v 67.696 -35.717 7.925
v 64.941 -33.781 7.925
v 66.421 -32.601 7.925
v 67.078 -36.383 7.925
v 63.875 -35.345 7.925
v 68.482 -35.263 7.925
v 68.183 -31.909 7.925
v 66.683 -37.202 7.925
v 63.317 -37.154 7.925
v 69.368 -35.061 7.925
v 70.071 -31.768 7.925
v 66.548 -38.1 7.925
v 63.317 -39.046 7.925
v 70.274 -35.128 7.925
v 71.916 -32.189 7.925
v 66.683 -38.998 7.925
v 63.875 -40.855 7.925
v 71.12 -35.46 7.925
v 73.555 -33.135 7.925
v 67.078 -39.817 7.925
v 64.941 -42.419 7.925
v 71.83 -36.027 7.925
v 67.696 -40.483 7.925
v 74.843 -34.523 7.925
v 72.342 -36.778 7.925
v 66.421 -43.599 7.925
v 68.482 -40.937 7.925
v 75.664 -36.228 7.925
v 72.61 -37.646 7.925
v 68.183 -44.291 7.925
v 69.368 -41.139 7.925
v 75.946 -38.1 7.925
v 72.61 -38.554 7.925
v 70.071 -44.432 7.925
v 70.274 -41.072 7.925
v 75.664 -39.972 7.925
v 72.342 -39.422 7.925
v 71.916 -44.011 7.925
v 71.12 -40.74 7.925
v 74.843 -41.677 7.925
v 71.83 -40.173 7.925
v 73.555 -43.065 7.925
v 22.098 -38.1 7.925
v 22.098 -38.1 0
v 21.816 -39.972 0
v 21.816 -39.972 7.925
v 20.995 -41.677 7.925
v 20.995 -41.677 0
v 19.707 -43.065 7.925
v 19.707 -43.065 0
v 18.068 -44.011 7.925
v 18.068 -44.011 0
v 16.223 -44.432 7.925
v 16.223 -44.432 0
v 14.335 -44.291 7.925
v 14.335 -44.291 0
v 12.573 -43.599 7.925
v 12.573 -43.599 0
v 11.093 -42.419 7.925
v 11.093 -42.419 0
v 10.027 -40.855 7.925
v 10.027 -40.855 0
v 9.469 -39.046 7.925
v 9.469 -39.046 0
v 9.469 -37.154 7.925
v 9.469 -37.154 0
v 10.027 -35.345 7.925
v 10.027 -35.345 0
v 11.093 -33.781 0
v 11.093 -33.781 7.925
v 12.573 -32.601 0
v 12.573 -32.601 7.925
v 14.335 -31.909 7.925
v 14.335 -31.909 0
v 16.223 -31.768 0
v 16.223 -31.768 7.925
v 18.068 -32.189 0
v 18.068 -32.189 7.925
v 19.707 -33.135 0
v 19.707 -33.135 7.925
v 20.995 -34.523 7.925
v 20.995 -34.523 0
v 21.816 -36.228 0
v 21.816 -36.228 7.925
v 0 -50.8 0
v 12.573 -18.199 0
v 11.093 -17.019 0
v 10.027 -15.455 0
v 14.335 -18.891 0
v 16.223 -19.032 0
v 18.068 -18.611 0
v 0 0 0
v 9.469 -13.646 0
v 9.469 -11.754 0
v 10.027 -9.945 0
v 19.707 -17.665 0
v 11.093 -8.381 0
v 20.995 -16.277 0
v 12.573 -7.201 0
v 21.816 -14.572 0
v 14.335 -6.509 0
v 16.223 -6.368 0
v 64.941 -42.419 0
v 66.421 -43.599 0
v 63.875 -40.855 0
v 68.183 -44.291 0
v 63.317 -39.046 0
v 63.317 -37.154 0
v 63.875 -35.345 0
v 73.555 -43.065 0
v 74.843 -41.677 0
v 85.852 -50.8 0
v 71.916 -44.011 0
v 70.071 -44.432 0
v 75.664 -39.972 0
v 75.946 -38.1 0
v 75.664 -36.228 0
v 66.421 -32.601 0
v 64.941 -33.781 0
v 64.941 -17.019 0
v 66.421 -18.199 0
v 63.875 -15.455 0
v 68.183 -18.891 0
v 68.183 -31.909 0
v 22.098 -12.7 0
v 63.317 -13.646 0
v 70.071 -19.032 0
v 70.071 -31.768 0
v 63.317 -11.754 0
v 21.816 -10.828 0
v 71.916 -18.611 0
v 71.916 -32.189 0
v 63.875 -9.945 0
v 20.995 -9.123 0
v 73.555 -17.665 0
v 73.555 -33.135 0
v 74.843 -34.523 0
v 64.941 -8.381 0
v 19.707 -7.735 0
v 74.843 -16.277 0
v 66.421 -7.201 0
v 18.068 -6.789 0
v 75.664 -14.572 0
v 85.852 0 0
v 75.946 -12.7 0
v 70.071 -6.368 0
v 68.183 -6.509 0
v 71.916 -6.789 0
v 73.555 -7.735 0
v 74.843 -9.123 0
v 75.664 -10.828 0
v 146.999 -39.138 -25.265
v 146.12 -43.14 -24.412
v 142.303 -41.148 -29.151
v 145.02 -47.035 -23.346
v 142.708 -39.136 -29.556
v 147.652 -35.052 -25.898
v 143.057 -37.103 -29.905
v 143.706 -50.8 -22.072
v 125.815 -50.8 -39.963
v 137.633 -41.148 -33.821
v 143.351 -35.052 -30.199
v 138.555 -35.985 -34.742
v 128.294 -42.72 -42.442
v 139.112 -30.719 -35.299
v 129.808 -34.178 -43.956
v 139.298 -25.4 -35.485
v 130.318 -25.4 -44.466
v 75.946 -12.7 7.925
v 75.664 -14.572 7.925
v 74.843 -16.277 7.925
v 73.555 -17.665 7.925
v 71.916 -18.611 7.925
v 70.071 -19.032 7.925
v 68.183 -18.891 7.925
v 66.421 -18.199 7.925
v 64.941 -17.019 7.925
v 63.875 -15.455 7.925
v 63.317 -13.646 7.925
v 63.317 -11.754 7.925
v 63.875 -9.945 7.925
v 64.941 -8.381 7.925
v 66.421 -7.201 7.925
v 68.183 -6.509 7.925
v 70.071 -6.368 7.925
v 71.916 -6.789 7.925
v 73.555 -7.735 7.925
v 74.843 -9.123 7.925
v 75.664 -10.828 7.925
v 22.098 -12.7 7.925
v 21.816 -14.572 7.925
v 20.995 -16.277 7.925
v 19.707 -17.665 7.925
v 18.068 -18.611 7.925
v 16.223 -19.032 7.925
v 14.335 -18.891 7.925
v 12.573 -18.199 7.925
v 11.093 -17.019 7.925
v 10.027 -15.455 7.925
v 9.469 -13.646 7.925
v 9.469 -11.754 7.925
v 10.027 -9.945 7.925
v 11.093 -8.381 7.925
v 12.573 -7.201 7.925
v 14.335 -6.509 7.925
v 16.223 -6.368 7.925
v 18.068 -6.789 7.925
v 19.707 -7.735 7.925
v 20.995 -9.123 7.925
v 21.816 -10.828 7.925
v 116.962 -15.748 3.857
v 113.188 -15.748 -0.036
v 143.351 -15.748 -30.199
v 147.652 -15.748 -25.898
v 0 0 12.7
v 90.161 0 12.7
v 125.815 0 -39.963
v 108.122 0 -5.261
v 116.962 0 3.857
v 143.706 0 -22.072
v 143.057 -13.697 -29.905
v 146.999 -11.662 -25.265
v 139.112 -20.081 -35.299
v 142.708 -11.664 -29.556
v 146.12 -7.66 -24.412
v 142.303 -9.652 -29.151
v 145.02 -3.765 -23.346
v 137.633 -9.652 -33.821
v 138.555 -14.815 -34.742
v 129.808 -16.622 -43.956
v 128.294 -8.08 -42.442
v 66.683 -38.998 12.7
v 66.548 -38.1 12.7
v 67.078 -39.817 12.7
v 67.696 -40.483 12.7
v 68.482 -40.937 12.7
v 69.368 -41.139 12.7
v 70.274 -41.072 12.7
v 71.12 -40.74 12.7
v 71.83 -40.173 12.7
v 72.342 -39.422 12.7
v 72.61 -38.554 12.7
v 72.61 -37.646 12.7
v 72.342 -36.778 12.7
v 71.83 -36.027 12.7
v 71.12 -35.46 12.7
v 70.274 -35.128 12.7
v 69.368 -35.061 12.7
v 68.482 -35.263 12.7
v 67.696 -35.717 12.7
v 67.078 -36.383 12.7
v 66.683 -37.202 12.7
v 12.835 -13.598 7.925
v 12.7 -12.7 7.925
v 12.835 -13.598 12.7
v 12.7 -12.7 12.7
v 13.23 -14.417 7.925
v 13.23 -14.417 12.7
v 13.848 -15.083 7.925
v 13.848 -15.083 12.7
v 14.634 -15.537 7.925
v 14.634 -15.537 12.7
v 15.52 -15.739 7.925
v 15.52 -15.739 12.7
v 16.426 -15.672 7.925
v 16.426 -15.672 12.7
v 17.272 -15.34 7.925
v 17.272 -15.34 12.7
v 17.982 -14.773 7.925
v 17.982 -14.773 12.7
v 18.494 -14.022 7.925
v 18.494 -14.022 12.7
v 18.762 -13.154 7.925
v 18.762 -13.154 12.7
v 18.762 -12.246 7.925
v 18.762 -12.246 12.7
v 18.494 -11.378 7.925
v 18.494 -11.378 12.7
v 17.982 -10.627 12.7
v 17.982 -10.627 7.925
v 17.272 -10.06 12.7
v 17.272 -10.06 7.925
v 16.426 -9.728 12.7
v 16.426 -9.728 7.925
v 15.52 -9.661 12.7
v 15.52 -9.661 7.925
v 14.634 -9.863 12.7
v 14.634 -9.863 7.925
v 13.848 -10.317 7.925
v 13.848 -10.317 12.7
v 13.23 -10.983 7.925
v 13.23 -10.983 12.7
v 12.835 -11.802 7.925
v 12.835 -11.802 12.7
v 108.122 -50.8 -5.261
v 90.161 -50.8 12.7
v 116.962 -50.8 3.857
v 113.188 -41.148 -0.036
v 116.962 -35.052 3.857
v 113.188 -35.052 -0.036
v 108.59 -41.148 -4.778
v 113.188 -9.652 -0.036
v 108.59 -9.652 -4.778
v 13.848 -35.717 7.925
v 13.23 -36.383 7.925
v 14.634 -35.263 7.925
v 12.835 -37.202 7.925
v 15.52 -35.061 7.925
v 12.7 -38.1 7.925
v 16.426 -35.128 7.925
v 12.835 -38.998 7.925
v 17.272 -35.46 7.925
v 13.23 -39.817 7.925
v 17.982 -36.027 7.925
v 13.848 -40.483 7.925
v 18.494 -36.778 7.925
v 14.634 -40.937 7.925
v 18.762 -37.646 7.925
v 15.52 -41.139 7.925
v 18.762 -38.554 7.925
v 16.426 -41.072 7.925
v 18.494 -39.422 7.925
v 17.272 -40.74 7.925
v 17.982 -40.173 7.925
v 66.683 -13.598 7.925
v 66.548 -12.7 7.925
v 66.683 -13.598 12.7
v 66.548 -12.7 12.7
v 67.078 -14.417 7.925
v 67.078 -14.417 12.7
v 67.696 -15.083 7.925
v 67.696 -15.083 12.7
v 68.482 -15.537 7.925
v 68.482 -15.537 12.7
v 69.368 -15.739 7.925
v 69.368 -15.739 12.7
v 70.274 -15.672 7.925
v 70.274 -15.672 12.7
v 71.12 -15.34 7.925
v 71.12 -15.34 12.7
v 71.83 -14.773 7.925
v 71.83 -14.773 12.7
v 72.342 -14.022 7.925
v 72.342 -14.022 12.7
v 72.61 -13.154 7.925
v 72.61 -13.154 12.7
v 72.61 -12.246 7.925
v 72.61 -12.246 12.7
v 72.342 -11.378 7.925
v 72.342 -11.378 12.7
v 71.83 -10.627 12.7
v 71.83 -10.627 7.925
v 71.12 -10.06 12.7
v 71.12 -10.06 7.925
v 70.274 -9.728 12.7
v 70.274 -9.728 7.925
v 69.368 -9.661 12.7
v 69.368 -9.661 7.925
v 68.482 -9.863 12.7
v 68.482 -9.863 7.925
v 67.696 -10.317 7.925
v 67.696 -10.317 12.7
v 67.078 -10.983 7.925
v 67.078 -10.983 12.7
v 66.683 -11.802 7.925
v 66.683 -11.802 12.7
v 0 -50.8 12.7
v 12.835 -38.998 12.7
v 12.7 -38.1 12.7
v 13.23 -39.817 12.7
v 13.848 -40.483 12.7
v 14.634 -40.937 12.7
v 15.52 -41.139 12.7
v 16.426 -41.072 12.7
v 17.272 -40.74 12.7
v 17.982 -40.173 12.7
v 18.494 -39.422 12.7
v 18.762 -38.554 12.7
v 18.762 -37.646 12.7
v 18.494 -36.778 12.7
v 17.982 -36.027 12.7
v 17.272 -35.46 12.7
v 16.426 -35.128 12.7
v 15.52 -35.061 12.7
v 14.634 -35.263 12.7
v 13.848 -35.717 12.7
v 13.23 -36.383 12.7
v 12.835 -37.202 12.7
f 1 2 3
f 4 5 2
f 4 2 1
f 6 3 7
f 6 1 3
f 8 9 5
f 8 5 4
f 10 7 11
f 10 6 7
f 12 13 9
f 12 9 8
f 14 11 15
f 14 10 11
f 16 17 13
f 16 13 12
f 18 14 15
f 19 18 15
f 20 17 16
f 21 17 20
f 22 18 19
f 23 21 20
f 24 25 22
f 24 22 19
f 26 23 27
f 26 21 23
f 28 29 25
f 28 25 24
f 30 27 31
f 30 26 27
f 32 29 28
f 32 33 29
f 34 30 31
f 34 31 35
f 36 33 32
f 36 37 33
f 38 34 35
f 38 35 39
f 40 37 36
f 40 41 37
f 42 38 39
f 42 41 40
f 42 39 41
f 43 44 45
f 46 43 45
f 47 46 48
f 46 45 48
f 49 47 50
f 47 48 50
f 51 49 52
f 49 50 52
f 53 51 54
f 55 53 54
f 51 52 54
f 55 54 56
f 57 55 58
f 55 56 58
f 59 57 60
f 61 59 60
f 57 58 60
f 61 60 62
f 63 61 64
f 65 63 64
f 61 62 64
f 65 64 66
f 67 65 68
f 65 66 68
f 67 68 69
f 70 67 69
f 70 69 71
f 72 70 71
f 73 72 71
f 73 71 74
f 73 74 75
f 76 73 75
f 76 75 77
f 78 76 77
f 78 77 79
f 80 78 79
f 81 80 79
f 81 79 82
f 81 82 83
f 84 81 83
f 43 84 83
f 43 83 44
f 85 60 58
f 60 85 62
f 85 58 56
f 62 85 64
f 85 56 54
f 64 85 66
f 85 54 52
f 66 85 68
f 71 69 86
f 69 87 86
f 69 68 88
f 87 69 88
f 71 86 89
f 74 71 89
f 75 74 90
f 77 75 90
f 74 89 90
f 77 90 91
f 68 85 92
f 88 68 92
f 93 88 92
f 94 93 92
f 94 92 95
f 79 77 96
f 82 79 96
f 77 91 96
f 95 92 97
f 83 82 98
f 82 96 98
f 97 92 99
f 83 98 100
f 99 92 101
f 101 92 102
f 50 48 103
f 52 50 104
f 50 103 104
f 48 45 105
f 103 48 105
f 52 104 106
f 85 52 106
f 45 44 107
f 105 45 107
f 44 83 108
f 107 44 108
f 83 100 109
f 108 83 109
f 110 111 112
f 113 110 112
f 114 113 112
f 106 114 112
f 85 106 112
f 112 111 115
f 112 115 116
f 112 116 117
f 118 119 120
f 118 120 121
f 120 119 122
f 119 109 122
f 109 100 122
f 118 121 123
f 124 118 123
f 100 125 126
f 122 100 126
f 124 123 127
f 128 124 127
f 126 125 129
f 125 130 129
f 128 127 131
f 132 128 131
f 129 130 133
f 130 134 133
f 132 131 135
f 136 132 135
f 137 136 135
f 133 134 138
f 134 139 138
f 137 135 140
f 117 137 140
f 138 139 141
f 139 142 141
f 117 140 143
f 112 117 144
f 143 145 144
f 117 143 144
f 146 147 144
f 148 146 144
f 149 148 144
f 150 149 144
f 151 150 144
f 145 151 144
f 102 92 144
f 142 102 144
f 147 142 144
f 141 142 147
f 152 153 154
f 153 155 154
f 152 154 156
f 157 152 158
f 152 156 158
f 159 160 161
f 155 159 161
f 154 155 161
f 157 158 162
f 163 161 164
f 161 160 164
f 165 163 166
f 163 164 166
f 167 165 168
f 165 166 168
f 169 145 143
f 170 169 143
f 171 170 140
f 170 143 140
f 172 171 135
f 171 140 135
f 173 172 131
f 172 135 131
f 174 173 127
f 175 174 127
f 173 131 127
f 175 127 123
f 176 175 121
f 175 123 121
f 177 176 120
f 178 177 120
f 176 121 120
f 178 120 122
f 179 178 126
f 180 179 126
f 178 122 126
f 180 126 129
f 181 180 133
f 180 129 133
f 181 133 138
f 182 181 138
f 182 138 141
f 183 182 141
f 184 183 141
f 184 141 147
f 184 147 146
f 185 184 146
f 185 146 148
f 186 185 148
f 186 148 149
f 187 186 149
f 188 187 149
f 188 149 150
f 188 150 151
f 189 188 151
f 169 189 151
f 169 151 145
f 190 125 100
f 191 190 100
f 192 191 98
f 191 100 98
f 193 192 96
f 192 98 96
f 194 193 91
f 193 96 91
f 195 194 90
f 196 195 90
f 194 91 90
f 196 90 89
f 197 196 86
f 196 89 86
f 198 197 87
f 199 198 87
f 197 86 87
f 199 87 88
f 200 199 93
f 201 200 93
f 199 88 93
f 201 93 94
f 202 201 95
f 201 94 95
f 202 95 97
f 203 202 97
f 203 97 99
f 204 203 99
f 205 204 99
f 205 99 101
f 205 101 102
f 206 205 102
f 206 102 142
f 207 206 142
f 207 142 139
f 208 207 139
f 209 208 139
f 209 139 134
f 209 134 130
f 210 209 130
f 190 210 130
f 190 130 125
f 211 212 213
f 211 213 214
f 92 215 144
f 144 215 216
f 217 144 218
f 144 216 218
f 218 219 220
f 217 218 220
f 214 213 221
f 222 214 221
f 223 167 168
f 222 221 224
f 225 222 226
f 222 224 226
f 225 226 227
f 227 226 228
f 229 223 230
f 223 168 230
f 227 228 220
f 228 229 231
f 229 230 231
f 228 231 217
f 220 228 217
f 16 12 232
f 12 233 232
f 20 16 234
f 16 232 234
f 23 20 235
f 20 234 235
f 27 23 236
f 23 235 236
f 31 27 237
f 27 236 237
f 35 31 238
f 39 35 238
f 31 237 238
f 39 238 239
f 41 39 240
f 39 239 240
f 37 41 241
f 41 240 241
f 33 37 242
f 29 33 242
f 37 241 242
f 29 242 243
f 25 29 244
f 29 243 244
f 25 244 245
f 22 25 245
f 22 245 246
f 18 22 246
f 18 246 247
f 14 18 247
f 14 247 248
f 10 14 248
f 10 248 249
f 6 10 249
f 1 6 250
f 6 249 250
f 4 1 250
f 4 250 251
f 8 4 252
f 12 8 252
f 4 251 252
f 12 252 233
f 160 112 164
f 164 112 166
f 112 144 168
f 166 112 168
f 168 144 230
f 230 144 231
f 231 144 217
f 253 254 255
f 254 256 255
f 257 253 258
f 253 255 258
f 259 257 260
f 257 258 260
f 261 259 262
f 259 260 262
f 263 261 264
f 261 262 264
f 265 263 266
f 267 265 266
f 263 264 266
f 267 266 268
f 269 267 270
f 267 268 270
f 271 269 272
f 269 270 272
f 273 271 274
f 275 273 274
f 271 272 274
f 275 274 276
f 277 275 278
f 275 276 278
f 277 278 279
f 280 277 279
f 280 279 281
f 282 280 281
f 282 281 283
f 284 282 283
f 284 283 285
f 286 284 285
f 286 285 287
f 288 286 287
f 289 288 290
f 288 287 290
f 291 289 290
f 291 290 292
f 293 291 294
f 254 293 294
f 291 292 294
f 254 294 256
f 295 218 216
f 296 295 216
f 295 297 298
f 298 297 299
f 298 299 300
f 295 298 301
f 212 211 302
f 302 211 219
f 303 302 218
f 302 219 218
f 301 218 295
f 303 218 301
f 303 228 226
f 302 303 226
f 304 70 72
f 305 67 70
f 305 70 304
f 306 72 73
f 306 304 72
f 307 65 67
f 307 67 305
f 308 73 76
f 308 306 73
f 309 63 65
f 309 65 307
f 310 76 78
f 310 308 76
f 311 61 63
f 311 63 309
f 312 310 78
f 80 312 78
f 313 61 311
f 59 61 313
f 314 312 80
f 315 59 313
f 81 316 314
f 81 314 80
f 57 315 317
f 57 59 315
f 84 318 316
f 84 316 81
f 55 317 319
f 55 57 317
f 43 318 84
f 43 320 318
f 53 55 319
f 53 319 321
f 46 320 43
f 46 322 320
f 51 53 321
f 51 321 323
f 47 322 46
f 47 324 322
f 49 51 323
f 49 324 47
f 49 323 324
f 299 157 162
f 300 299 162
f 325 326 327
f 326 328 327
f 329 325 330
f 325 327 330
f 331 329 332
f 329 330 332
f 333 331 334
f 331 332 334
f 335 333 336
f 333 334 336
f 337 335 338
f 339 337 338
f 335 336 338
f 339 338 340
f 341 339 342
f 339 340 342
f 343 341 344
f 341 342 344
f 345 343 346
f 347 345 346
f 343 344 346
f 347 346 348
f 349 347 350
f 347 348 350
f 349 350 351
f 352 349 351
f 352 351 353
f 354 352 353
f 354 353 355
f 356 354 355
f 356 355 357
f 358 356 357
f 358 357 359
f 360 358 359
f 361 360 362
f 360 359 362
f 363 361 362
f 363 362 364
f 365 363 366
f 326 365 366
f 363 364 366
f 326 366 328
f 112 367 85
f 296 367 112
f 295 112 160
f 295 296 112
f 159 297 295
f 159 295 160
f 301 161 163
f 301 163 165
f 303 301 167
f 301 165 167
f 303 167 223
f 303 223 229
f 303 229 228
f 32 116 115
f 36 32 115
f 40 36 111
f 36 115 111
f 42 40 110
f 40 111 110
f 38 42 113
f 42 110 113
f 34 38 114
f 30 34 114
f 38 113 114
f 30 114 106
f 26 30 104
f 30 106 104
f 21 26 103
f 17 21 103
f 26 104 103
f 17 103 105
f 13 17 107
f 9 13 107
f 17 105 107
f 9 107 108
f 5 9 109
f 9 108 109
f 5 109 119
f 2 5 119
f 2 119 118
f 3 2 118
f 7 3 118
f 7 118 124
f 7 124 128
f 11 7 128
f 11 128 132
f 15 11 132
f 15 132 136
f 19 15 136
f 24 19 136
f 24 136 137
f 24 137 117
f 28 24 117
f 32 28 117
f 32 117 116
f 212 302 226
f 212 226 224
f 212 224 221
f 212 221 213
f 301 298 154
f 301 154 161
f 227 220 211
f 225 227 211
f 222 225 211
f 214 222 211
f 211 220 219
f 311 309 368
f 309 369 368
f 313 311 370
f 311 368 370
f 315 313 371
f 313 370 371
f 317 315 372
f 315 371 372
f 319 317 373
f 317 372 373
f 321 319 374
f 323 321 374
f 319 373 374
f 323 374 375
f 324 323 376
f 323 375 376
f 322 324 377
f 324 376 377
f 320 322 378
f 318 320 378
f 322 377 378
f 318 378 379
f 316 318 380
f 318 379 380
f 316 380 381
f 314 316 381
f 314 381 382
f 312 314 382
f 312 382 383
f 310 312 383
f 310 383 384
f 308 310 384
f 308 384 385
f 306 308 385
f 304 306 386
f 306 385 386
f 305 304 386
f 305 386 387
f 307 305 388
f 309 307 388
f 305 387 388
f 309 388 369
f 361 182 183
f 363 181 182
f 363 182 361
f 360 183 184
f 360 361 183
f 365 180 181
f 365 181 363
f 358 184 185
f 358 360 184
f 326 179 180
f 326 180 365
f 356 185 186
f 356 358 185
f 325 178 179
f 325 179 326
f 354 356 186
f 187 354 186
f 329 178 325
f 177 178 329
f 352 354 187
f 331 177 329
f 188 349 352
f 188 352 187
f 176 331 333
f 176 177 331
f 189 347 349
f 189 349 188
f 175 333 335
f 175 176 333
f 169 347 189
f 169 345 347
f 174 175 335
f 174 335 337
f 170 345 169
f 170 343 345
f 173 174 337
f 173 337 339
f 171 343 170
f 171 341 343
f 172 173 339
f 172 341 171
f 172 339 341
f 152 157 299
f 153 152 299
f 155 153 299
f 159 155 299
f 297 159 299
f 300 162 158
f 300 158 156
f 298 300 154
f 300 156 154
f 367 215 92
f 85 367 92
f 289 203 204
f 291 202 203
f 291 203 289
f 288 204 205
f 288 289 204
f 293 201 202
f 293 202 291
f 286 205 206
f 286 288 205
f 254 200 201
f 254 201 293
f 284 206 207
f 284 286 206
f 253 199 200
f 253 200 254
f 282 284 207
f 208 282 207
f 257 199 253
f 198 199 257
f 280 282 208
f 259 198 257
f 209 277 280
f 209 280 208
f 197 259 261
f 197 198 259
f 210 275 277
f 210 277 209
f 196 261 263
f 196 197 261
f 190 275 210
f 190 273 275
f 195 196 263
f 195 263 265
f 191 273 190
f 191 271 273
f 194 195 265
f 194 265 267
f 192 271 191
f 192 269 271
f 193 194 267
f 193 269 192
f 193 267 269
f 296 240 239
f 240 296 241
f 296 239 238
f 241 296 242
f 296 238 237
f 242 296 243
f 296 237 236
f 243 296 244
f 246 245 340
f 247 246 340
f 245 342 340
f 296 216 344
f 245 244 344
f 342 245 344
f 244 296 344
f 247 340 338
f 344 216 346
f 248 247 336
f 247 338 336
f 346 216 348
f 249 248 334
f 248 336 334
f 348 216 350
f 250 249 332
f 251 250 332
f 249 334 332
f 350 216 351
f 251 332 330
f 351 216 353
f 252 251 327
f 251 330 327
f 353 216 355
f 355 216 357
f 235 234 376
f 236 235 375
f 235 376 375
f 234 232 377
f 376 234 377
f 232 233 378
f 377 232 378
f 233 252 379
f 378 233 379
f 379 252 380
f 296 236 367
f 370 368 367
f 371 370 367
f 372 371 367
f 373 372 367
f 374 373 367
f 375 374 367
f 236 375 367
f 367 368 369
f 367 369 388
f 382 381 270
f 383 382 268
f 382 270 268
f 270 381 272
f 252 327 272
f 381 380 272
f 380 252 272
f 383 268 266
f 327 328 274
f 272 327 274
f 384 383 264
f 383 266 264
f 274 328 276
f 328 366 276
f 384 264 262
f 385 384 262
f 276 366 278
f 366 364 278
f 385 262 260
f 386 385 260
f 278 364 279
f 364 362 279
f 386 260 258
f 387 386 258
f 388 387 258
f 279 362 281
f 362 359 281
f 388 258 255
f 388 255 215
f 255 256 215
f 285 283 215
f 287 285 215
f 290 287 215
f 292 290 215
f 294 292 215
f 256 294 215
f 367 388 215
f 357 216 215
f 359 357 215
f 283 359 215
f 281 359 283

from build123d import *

# Parameters (mm, degrees)
F1_DEPTH       = 50.8
F3_D           = 6.096
F3_CBORE_D     = 12.7
F3_CBORE_DEPTH = 7.9248
F5_DEPTH       = 132.571551198
F7_DEPTH       = 53.1231379703


with BuildPart() as f1:
    # F0 (on Front) → F1 (new body)
    with BuildSketch(Plane.XZ):
        Polygon((0, 12.7), (0, 0), (85.852, 0), (130.3175357378, -44.4655357378), (148.2780479799, -26.5050234956), (116.9623968646, 3.8574382814), (108.1219795526, -5.2605122421), (90.1614673105, 12.7), align=None)
    extrude(amount=F1_DEPTH)

    # F3 (through all)
    with Locations(Plane(origin=(0, 0, 0), x_dir=(1, 0, 0), z_dir=(0, 0, -1))):
        with Locations((15.748, 38.1), (15.748, 12.7), (69.596, 12.7), (69.596, 38.1)):
            CounterBoreHole(F3_D / 2, F3_CBORE_D / 2, F3_CBORE_DEPTH)

    # F4 (on face) → F5 (cut, through all)
    with BuildSketch(Plane(origin=(87.3915357378, 0, -87.3915357378), x_dir=(0, 1, 0), z_dir=(0.7071067812, 0, -0.7071067812))):
        Polygon((-15.748, 86.1065313784), (-35.052, 86.1065313784), (-35.052, 80.0105313784), (-41.148, 80.0105313784), (-41.148, 73.4065313784), (-25.4, 73.4065313784), (-9.652, 73.4065313784), (-9.652, 80.0105313784), (-15.748, 80.0105313784), align=None)
    extrude(amount=-F5_DEPTH, mode=Mode.SUBTRACT)

    # F6 (on face) → F7 (cut, through all)
    with BuildSketch(Plane(origin=(42.926, 0, 42.926), x_dir=(0, -1, 0), z_dir=(-0.7071067812, 0, -0.7071067812))):
        with BuildLine():
            ThreePointArc((25.4, -123.590295077), (12.3070777205, -121.9743014541), (0, -117.2233134317))
            Line((0, -117.2233134317), (0, -123.590295077))
            Line((0, -123.590295077), (25.4, -123.590295077))
        make_face()
        with BuildLine():
            ThreePointArc((50.8, -117.2233134317), (38.4929222795, -121.9743014541), (25.4, -123.590295077))
            Line((25.4, -123.590295077), (50.8, -123.590295077))
            Line((50.8, -123.590295077), (50.8, -117.2233134317))
        make_face()
    extrude(amount=-F7_DEPTH, mode=Mode.SUBTRACT)


solid = f1.part
